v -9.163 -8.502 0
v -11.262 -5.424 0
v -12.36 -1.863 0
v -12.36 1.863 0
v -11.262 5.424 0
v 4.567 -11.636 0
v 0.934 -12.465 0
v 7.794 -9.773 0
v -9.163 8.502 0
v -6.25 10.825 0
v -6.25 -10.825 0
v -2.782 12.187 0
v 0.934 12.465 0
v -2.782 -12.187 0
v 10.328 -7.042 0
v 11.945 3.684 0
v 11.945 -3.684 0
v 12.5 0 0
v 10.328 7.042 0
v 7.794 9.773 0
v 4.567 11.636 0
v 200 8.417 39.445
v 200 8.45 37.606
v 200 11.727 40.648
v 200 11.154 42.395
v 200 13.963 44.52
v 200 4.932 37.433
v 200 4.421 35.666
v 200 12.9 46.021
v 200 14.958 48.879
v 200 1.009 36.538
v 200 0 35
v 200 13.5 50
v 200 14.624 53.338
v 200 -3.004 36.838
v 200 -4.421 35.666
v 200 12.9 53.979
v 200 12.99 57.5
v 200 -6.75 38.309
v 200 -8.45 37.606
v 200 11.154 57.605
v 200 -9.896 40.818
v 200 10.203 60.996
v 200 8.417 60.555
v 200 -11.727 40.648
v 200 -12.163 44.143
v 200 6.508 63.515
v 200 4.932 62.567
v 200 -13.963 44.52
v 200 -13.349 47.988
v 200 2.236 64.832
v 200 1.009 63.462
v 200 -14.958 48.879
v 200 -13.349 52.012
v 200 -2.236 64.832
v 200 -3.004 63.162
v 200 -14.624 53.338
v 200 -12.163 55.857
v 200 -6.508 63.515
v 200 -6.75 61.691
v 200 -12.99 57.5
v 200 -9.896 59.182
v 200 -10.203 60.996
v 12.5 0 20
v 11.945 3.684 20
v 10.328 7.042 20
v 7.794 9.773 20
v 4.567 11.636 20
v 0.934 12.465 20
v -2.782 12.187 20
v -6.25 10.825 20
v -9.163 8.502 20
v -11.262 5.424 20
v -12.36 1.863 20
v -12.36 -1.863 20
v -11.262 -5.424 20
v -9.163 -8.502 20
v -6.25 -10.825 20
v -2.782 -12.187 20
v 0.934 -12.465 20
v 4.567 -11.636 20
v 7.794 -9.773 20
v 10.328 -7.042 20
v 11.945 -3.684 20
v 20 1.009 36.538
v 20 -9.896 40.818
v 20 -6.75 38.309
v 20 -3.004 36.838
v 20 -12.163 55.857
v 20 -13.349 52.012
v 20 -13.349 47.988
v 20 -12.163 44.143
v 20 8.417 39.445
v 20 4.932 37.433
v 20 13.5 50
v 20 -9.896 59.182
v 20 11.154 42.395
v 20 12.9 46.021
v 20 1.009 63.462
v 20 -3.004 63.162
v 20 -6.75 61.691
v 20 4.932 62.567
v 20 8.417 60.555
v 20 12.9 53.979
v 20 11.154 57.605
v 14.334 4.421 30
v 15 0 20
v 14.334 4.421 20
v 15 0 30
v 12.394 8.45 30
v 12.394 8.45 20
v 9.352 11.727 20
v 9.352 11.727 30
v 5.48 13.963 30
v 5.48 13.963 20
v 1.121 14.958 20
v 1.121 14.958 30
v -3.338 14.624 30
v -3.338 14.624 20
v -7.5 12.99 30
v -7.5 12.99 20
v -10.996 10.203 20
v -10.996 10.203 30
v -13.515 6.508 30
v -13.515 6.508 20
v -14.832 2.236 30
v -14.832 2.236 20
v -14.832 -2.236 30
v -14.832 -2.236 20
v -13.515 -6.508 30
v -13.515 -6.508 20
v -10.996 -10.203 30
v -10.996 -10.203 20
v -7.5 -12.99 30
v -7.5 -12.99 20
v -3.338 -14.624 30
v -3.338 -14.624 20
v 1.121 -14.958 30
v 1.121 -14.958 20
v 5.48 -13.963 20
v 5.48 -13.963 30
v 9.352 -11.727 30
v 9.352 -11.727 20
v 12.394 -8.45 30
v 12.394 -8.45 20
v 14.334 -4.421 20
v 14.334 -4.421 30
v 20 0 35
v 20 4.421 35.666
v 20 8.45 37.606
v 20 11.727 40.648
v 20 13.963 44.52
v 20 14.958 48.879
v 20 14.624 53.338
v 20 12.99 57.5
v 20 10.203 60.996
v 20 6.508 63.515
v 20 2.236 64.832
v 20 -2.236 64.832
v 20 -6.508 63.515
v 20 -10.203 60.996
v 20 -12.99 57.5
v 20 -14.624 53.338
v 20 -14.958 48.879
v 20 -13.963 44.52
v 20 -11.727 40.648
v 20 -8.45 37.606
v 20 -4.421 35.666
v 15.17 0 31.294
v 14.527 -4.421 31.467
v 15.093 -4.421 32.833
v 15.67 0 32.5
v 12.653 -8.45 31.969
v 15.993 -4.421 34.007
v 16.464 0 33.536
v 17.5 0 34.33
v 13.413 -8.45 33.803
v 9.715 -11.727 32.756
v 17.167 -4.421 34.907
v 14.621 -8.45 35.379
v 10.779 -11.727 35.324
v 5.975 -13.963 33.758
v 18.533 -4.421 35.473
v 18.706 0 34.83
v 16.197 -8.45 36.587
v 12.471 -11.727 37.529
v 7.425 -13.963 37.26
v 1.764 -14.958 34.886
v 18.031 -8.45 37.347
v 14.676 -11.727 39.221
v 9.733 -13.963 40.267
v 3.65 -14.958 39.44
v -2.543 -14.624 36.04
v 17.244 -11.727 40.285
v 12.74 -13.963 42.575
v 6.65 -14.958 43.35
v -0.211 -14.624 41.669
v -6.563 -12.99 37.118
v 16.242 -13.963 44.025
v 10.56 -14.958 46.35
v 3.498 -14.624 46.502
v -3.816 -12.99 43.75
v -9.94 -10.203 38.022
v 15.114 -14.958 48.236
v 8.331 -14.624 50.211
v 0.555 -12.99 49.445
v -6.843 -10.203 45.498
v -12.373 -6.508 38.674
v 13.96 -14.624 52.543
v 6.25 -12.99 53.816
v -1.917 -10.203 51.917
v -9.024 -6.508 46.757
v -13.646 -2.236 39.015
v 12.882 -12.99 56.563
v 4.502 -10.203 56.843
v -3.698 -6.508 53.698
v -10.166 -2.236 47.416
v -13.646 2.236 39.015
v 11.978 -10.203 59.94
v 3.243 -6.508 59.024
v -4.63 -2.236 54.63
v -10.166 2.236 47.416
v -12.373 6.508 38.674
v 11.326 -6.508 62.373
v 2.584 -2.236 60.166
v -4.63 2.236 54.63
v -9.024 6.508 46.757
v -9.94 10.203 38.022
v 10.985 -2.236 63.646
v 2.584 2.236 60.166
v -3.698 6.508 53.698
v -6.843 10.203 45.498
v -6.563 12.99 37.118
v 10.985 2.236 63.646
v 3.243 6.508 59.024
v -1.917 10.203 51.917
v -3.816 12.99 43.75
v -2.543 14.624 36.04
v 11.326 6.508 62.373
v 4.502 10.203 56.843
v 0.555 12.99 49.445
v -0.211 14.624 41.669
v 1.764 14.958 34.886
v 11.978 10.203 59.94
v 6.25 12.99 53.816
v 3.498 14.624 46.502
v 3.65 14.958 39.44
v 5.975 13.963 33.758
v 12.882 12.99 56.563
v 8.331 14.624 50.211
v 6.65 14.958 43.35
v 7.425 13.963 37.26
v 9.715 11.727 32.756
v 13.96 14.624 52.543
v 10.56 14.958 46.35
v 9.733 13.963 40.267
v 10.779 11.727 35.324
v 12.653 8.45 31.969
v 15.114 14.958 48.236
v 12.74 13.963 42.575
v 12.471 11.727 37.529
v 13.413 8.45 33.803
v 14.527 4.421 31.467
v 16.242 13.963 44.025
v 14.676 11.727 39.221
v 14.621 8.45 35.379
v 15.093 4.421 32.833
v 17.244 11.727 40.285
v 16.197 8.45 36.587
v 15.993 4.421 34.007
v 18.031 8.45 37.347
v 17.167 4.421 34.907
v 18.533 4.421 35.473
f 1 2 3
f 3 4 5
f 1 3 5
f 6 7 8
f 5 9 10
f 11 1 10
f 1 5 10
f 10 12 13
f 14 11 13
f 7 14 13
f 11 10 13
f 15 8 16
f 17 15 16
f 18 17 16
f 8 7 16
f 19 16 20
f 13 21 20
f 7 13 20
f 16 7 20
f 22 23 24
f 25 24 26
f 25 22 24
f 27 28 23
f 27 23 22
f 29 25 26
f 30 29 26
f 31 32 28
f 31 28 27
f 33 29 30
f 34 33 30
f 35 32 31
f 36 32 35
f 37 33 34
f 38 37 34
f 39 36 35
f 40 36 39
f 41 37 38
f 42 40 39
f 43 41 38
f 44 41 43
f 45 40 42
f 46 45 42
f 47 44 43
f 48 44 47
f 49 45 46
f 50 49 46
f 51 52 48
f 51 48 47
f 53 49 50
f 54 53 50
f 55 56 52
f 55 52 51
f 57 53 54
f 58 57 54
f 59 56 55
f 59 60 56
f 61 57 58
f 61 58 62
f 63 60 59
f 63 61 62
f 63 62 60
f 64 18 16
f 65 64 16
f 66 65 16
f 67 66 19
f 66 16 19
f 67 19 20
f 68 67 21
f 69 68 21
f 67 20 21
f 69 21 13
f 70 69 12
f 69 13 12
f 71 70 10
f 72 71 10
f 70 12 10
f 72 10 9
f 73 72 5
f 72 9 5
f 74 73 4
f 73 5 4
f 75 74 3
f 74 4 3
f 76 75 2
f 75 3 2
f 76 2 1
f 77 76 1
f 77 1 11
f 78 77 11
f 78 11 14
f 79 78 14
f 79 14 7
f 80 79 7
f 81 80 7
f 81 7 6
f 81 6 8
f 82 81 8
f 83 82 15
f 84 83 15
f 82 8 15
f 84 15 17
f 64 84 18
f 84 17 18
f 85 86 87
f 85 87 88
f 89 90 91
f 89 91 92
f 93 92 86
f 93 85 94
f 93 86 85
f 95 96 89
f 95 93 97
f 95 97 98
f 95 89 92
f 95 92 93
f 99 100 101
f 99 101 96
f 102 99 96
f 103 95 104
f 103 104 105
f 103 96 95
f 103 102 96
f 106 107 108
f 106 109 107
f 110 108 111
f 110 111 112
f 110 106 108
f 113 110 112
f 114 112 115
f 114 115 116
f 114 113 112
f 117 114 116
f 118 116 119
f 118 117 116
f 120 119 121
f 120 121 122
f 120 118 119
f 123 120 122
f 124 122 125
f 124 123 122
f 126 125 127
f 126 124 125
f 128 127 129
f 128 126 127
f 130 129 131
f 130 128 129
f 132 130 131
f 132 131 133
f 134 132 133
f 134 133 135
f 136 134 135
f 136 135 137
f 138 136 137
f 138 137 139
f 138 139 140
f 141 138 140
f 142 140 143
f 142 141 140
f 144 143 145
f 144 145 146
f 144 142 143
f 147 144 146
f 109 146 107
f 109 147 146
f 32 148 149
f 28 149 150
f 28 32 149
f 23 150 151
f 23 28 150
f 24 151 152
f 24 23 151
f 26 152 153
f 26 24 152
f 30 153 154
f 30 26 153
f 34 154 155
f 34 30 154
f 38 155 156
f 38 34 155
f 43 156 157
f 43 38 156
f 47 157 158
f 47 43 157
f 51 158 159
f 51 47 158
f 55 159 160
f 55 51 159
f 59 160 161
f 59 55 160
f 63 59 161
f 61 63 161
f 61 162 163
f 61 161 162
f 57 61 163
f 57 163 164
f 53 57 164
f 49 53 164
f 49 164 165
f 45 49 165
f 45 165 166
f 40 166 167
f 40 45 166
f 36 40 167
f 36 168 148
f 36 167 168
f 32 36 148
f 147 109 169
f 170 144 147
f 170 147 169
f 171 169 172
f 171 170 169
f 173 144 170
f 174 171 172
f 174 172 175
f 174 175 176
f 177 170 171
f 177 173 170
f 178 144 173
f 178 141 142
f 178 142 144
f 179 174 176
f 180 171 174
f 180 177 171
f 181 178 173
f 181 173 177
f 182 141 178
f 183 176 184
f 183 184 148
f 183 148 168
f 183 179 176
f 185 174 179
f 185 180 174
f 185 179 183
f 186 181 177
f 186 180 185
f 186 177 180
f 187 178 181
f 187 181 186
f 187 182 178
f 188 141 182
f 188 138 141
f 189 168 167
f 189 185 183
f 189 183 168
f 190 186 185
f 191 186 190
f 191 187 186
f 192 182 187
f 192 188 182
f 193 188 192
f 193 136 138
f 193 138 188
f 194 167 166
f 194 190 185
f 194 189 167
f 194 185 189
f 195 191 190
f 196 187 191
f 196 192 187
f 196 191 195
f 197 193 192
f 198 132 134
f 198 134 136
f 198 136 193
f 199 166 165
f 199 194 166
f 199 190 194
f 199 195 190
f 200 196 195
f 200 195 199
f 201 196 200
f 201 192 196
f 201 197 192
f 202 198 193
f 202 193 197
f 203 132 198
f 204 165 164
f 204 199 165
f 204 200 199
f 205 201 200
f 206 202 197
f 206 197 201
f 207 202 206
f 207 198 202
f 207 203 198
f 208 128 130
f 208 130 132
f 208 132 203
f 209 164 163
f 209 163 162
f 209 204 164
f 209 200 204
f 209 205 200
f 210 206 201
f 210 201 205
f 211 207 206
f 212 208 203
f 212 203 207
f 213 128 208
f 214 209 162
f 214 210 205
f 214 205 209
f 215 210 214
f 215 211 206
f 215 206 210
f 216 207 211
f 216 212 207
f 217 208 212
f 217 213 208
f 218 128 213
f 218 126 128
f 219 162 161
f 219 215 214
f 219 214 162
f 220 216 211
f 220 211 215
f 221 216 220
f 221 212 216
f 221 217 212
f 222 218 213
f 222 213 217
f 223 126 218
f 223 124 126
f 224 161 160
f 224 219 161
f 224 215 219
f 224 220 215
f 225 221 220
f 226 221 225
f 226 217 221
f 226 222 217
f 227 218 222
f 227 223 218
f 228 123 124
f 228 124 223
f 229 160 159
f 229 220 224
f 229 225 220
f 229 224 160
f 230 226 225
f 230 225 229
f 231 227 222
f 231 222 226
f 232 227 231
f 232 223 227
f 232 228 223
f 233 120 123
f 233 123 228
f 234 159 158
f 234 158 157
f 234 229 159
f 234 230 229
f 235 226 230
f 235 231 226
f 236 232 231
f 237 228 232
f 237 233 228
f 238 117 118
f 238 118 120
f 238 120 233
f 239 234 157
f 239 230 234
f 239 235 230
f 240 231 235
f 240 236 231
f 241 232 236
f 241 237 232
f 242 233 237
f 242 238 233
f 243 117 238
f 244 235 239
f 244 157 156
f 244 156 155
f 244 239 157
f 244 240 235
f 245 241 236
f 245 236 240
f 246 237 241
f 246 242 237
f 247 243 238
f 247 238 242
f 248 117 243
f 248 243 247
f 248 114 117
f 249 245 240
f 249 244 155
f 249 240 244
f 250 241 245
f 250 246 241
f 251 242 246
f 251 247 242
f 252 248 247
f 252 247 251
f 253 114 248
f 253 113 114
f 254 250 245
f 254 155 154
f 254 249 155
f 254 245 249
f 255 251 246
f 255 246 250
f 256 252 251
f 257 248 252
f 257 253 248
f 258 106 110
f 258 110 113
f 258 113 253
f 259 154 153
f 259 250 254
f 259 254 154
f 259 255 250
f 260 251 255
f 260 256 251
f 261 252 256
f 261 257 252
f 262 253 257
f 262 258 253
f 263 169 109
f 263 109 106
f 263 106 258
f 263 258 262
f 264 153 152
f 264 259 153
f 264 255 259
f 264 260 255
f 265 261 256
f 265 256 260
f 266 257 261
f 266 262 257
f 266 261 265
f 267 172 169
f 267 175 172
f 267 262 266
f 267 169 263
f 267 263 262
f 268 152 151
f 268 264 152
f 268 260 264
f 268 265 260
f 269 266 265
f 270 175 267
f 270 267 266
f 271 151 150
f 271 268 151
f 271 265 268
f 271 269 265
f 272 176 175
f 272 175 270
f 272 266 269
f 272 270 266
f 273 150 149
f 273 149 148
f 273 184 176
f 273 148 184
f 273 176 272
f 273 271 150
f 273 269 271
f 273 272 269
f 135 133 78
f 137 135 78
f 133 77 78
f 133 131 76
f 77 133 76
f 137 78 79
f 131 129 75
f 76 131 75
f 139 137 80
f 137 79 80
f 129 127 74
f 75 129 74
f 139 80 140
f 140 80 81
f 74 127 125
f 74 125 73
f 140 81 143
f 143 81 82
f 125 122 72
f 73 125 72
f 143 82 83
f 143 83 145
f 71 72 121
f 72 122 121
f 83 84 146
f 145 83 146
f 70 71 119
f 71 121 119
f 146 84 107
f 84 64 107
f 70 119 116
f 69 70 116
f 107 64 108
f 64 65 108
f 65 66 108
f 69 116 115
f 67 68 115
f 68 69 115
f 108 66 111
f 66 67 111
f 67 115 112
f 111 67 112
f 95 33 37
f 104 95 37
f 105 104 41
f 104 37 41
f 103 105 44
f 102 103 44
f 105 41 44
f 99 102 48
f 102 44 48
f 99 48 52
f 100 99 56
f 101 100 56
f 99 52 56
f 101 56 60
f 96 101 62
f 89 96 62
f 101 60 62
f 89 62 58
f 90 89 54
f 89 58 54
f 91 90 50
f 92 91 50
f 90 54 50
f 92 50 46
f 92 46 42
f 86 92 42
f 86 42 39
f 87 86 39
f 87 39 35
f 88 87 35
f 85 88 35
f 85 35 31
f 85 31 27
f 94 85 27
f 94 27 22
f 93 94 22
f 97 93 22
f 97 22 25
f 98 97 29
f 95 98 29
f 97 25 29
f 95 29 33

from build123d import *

# Parameters (mm, degrees)
F1_R     = 15
F3_R     = 15
F3_R_2   = 12.5
F4_DEPTH = 20
F5_R     = 13.5
F6_DEPTH = 180


with BuildPart() as f2:
    # F2: sweep along a path in F0
    with BuildLine(Plane.XZ) as f2_path:
        Line((0, 0), (0, 30))
        ThreePointArc((0, 30), (5.8578643763, 44.1421356237), (20, 50))
        Line((20, 50), (200, 50))
    # F1 (on Top) → F2 (sweep)
    with BuildSketch(Plane.XY):
        Circle(F1_R)
    sweep(path=f2_path.line)

    # F3 (on Top) → F4 (cut)
    with BuildSketch(Plane.XY):
        Circle(F3_R)
        Circle(F3_R_2, mode=Mode.SUBTRACT)
    extrude(amount=F4_DEPTH, mode=Mode.SUBTRACT)

    # F5 (on face) → F6 (cut)
    with BuildSketch(Plane.YZ.offset(200)):
        with Locations((0, 50)):
            Circle(F5_R)
    extrude(amount=-F6_DEPTH, mode=Mode.SUBTRACT)


solid = f2.part
